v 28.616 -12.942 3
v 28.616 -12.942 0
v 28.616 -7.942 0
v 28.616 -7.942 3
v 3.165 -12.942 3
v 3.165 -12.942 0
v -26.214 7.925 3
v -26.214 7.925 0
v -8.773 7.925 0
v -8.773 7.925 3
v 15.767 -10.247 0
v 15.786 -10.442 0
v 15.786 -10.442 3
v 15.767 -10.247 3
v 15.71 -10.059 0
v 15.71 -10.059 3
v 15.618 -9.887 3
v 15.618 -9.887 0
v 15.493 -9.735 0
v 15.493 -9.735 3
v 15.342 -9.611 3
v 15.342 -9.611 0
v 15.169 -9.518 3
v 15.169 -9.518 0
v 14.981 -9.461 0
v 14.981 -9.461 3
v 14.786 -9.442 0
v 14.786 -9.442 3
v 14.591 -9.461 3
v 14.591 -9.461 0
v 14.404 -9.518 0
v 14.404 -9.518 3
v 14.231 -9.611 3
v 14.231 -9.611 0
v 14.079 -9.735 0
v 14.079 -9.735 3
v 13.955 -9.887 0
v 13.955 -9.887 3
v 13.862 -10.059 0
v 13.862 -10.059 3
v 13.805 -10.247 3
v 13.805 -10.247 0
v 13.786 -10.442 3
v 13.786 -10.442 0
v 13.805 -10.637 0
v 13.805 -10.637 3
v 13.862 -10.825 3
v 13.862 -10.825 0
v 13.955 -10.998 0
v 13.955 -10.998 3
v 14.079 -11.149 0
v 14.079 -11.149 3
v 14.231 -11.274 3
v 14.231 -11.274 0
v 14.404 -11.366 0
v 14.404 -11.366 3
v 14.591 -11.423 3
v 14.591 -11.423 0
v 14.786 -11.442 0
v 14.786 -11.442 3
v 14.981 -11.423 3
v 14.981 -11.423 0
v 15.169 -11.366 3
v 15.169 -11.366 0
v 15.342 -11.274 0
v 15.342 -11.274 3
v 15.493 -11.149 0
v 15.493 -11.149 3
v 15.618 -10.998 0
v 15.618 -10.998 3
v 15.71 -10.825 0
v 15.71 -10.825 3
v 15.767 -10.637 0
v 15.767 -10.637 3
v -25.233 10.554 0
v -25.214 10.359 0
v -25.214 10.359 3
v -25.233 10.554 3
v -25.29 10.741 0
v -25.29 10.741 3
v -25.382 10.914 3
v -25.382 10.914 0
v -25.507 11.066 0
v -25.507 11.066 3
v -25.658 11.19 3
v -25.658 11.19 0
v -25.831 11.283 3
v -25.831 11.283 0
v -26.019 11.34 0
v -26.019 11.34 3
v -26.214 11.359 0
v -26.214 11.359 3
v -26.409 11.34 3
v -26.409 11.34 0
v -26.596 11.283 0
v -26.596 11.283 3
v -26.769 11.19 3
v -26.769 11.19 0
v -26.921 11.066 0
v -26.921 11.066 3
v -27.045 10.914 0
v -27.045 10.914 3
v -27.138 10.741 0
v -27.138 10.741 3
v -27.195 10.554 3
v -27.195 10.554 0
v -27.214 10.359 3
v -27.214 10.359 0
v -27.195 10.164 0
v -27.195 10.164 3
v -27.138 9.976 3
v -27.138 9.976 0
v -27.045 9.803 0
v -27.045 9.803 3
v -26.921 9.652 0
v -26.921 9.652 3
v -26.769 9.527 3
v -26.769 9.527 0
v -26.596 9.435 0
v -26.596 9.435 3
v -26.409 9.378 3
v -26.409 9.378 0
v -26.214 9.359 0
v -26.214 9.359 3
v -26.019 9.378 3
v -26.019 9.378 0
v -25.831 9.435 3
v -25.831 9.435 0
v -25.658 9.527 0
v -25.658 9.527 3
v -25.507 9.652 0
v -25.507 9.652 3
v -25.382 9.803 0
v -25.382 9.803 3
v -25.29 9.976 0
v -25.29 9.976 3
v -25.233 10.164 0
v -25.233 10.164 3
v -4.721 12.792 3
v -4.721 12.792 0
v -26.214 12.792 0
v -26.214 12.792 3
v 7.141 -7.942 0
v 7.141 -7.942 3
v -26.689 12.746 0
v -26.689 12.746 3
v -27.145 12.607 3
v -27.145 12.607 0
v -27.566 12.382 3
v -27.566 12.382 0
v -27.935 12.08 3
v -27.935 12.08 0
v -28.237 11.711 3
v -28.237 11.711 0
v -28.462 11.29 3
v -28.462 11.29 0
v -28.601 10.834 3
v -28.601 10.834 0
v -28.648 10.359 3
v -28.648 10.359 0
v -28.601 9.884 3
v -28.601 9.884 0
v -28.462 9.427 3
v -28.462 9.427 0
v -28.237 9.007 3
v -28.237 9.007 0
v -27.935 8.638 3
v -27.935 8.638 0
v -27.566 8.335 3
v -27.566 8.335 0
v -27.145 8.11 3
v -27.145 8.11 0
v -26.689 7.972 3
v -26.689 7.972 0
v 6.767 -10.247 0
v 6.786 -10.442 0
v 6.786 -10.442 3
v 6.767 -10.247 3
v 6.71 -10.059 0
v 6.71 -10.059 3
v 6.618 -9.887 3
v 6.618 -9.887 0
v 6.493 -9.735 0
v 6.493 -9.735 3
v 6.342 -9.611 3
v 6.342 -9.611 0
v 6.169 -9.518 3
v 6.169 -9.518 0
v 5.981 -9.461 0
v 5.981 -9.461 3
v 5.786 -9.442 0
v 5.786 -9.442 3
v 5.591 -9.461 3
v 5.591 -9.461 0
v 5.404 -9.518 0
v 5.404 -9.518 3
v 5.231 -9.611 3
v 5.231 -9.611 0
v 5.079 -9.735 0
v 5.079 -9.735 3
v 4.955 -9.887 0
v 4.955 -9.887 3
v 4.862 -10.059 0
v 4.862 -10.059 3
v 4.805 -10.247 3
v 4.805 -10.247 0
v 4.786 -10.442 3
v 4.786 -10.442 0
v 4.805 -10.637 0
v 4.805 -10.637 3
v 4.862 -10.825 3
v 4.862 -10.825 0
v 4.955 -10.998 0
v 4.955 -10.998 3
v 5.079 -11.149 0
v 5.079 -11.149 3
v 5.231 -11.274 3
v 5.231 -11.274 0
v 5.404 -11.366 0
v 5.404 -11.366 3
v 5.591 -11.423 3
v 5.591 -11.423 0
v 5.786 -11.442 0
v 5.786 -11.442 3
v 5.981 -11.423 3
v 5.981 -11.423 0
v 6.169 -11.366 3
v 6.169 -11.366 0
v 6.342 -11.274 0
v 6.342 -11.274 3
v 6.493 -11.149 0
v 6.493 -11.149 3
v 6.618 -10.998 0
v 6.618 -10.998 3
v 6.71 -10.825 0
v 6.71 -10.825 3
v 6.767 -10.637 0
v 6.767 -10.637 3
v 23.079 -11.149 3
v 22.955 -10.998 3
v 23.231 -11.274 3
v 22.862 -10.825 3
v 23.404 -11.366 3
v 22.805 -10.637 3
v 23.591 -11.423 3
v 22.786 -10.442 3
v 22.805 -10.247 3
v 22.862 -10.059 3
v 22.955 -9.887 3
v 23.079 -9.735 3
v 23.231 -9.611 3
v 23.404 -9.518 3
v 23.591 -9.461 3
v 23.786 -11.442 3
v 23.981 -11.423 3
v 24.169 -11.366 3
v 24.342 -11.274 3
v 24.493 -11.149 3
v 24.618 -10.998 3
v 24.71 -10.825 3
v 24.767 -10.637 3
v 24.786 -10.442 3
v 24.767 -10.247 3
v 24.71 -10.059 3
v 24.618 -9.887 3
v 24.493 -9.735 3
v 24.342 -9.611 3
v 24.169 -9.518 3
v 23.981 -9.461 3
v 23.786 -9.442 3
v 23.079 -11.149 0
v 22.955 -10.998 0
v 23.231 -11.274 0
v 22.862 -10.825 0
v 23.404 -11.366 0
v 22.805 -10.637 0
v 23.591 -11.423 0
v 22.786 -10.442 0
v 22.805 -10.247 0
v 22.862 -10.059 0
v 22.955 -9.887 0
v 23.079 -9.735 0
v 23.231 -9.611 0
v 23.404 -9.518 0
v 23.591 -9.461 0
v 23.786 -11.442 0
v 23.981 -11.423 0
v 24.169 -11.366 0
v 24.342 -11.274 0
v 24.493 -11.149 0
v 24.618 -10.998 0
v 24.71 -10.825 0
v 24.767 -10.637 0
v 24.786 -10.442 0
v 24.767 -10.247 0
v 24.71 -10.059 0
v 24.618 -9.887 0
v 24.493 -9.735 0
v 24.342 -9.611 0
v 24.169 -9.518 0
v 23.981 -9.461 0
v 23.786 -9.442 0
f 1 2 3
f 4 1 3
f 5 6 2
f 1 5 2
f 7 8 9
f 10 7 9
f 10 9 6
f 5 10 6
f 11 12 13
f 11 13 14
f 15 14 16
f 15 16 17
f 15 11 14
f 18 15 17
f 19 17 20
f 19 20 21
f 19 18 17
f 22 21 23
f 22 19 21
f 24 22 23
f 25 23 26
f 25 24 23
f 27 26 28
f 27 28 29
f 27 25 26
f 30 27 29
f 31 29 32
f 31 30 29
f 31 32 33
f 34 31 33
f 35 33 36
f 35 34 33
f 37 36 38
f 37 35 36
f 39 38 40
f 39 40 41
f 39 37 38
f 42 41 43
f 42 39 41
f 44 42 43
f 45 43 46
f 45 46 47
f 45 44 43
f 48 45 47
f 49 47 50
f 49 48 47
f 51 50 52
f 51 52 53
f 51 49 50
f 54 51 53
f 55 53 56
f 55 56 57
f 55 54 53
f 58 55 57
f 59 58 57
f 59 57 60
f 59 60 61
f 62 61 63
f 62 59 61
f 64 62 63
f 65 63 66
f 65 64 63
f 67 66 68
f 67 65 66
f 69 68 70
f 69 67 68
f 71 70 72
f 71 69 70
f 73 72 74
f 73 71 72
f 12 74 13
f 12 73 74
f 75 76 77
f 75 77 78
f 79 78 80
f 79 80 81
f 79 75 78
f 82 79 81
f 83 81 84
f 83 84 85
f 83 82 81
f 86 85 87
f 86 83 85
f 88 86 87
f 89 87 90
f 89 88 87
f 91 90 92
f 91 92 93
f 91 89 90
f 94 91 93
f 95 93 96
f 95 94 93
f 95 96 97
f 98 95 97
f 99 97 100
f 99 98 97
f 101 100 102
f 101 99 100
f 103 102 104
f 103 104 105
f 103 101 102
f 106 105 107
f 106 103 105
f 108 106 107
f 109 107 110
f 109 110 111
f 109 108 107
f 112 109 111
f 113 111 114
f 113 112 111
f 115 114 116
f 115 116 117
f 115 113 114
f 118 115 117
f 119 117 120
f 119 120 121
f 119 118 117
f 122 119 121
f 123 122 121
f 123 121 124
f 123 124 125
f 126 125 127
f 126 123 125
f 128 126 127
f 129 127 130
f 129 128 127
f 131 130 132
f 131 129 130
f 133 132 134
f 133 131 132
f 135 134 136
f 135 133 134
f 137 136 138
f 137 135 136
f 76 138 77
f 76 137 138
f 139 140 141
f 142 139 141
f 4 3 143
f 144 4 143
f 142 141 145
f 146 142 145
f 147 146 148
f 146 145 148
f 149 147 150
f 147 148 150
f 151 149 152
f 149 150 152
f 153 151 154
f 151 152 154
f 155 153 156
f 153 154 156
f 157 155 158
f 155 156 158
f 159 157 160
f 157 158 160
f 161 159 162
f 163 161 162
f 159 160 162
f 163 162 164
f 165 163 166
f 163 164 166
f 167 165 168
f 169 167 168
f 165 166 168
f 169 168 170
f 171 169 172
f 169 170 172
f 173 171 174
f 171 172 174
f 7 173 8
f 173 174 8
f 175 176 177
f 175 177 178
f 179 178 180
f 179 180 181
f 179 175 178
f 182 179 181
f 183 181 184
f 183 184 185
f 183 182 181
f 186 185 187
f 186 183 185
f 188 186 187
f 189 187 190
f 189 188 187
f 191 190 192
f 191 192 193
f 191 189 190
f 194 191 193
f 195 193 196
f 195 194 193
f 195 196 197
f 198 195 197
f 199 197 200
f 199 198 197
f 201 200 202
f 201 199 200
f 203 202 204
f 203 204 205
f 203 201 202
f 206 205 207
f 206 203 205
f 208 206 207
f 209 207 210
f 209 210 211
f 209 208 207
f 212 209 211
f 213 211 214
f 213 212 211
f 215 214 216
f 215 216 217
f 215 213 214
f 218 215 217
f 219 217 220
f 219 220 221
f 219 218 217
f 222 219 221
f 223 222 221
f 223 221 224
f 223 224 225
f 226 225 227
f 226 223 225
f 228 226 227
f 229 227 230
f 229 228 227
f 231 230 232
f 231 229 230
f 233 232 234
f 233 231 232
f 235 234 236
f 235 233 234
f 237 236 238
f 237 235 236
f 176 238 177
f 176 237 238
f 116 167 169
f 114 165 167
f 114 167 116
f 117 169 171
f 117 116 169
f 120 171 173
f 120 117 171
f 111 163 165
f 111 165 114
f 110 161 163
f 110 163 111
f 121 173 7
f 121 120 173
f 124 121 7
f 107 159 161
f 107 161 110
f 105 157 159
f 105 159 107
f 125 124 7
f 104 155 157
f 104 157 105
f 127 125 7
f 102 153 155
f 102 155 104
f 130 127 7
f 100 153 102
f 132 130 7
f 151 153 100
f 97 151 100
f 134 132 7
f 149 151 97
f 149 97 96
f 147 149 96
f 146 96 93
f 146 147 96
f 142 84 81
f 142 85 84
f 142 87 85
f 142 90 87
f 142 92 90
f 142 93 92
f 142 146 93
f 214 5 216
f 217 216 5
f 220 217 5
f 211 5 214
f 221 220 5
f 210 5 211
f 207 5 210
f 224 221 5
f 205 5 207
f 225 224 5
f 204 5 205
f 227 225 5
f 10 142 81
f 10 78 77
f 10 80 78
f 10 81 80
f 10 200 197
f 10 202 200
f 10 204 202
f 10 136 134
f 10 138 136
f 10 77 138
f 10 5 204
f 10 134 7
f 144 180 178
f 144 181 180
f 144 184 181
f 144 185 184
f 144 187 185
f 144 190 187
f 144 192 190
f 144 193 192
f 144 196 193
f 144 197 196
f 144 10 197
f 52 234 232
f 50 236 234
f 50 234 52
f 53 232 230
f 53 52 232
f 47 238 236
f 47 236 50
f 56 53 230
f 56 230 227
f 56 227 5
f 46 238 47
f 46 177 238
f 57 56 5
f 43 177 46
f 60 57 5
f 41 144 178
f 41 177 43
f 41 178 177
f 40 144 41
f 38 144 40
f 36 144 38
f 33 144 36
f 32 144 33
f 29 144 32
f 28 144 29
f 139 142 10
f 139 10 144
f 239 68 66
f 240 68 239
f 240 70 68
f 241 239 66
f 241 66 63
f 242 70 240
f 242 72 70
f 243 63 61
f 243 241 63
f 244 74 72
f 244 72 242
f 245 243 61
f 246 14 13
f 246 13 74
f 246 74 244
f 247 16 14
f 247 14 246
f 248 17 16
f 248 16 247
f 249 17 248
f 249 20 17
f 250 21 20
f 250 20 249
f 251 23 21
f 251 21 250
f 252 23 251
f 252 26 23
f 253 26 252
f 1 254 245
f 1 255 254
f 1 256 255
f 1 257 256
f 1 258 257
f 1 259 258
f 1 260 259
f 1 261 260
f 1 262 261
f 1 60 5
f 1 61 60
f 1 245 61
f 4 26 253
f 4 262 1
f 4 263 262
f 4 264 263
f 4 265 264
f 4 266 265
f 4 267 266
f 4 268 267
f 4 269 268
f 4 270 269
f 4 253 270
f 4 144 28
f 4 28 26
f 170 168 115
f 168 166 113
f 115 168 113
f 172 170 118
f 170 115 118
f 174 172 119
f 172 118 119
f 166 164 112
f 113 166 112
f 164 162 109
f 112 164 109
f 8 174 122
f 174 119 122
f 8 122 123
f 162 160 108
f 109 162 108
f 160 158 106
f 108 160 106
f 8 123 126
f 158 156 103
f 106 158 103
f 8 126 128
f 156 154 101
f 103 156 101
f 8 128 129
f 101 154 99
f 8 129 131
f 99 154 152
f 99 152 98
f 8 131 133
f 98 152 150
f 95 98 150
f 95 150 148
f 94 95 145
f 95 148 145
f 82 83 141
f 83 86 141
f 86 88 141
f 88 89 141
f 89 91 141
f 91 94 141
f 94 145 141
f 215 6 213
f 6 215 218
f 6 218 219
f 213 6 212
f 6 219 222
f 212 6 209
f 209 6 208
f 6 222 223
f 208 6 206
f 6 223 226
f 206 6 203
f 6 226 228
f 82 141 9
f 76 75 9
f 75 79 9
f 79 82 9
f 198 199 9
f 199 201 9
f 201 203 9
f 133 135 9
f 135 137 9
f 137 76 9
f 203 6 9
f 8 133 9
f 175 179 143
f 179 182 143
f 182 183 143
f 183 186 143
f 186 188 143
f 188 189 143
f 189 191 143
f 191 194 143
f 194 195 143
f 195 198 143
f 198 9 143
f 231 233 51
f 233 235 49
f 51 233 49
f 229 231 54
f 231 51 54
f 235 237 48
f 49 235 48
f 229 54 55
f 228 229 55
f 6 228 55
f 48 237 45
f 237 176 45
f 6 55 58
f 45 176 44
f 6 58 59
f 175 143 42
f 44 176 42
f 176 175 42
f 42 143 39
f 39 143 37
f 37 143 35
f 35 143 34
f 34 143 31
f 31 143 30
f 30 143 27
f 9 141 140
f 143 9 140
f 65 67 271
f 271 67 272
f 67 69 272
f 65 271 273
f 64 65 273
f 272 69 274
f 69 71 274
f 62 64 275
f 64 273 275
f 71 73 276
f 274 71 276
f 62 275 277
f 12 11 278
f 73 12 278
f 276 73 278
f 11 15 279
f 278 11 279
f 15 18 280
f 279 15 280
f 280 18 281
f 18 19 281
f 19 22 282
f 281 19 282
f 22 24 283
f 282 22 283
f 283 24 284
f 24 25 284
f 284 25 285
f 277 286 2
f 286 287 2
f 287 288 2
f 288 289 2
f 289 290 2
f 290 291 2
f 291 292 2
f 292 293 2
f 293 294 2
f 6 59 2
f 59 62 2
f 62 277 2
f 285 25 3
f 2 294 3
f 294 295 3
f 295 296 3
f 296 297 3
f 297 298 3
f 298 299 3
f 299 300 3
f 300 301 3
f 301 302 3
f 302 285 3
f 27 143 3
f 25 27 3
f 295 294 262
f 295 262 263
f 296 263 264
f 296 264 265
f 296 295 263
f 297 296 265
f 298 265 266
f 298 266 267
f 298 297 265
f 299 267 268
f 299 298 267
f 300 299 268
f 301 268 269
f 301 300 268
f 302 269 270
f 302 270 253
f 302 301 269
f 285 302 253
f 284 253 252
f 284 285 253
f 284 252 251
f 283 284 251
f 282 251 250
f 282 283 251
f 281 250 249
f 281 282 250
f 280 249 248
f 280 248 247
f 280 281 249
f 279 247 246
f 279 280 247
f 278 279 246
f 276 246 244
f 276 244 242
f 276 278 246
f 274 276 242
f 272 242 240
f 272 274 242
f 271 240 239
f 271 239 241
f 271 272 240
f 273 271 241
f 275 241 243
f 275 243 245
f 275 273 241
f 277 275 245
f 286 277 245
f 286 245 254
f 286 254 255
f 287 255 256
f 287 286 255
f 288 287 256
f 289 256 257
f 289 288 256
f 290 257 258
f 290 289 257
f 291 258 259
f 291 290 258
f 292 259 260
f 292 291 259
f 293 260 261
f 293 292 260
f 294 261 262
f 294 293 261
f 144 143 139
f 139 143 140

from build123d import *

# Parameters (mm, degrees)
SKETCH_1_R      = 1.000011627
SKETCH_1_R_2    = 1.000010171
SKETCH_1_R_3    = 1.000011034
SKETCH_1_R_4    = 1
EXTRUDE_1_DEPTH = 3


with BuildPart() as part:
    # 草图1 → 凸台-拉伸1 (new body)
    with BuildSketch(Plane.XY):
        with BuildLine():
            Line((28.616000433, -12.942129643), (28.616000433, -7.942129643))
            Line((28.616000433, -7.942129643), (7.141456549, -7.942129643))
            Line((7.141456549, -7.942129643), (-4.721197167, 12.792497513))
            Line((-4.721197167, 12.792497513), (-26.213755395, 12.792497513))
            ThreePointArc((-26.213755395, 12.792497513), (-28.647529033, 10.358723875), (-26.213755395, 7.924950238))
            Line((-26.213755395, 7.924950238), (-8.773244901, 7.924950238))
            Line((-8.773244901, 7.924950238), (3.165187405, -12.942129643))
            Line((3.165187405, -12.942129643), (28.616000433, -12.942129643))
        make_face()
        with Locations((5.786244634, -10.442129643)):
            Circle(SKETCH_1_R, mode=Mode.SUBTRACT)
        with Locations((14.786244634, -10.442129643)):
            Circle(SKETCH_1_R_2, mode=Mode.SUBTRACT)
        with Locations((23.786244634, -10.442129643)):
            Circle(SKETCH_1_R_3, mode=Mode.SUBTRACT)
        with Locations((-26.213755395, 10.358723875)):
            Circle(SKETCH_1_R_4, mode=Mode.SUBTRACT)
    extrude(amount=EXTRUDE_1_DEPTH)


solid = part.part
